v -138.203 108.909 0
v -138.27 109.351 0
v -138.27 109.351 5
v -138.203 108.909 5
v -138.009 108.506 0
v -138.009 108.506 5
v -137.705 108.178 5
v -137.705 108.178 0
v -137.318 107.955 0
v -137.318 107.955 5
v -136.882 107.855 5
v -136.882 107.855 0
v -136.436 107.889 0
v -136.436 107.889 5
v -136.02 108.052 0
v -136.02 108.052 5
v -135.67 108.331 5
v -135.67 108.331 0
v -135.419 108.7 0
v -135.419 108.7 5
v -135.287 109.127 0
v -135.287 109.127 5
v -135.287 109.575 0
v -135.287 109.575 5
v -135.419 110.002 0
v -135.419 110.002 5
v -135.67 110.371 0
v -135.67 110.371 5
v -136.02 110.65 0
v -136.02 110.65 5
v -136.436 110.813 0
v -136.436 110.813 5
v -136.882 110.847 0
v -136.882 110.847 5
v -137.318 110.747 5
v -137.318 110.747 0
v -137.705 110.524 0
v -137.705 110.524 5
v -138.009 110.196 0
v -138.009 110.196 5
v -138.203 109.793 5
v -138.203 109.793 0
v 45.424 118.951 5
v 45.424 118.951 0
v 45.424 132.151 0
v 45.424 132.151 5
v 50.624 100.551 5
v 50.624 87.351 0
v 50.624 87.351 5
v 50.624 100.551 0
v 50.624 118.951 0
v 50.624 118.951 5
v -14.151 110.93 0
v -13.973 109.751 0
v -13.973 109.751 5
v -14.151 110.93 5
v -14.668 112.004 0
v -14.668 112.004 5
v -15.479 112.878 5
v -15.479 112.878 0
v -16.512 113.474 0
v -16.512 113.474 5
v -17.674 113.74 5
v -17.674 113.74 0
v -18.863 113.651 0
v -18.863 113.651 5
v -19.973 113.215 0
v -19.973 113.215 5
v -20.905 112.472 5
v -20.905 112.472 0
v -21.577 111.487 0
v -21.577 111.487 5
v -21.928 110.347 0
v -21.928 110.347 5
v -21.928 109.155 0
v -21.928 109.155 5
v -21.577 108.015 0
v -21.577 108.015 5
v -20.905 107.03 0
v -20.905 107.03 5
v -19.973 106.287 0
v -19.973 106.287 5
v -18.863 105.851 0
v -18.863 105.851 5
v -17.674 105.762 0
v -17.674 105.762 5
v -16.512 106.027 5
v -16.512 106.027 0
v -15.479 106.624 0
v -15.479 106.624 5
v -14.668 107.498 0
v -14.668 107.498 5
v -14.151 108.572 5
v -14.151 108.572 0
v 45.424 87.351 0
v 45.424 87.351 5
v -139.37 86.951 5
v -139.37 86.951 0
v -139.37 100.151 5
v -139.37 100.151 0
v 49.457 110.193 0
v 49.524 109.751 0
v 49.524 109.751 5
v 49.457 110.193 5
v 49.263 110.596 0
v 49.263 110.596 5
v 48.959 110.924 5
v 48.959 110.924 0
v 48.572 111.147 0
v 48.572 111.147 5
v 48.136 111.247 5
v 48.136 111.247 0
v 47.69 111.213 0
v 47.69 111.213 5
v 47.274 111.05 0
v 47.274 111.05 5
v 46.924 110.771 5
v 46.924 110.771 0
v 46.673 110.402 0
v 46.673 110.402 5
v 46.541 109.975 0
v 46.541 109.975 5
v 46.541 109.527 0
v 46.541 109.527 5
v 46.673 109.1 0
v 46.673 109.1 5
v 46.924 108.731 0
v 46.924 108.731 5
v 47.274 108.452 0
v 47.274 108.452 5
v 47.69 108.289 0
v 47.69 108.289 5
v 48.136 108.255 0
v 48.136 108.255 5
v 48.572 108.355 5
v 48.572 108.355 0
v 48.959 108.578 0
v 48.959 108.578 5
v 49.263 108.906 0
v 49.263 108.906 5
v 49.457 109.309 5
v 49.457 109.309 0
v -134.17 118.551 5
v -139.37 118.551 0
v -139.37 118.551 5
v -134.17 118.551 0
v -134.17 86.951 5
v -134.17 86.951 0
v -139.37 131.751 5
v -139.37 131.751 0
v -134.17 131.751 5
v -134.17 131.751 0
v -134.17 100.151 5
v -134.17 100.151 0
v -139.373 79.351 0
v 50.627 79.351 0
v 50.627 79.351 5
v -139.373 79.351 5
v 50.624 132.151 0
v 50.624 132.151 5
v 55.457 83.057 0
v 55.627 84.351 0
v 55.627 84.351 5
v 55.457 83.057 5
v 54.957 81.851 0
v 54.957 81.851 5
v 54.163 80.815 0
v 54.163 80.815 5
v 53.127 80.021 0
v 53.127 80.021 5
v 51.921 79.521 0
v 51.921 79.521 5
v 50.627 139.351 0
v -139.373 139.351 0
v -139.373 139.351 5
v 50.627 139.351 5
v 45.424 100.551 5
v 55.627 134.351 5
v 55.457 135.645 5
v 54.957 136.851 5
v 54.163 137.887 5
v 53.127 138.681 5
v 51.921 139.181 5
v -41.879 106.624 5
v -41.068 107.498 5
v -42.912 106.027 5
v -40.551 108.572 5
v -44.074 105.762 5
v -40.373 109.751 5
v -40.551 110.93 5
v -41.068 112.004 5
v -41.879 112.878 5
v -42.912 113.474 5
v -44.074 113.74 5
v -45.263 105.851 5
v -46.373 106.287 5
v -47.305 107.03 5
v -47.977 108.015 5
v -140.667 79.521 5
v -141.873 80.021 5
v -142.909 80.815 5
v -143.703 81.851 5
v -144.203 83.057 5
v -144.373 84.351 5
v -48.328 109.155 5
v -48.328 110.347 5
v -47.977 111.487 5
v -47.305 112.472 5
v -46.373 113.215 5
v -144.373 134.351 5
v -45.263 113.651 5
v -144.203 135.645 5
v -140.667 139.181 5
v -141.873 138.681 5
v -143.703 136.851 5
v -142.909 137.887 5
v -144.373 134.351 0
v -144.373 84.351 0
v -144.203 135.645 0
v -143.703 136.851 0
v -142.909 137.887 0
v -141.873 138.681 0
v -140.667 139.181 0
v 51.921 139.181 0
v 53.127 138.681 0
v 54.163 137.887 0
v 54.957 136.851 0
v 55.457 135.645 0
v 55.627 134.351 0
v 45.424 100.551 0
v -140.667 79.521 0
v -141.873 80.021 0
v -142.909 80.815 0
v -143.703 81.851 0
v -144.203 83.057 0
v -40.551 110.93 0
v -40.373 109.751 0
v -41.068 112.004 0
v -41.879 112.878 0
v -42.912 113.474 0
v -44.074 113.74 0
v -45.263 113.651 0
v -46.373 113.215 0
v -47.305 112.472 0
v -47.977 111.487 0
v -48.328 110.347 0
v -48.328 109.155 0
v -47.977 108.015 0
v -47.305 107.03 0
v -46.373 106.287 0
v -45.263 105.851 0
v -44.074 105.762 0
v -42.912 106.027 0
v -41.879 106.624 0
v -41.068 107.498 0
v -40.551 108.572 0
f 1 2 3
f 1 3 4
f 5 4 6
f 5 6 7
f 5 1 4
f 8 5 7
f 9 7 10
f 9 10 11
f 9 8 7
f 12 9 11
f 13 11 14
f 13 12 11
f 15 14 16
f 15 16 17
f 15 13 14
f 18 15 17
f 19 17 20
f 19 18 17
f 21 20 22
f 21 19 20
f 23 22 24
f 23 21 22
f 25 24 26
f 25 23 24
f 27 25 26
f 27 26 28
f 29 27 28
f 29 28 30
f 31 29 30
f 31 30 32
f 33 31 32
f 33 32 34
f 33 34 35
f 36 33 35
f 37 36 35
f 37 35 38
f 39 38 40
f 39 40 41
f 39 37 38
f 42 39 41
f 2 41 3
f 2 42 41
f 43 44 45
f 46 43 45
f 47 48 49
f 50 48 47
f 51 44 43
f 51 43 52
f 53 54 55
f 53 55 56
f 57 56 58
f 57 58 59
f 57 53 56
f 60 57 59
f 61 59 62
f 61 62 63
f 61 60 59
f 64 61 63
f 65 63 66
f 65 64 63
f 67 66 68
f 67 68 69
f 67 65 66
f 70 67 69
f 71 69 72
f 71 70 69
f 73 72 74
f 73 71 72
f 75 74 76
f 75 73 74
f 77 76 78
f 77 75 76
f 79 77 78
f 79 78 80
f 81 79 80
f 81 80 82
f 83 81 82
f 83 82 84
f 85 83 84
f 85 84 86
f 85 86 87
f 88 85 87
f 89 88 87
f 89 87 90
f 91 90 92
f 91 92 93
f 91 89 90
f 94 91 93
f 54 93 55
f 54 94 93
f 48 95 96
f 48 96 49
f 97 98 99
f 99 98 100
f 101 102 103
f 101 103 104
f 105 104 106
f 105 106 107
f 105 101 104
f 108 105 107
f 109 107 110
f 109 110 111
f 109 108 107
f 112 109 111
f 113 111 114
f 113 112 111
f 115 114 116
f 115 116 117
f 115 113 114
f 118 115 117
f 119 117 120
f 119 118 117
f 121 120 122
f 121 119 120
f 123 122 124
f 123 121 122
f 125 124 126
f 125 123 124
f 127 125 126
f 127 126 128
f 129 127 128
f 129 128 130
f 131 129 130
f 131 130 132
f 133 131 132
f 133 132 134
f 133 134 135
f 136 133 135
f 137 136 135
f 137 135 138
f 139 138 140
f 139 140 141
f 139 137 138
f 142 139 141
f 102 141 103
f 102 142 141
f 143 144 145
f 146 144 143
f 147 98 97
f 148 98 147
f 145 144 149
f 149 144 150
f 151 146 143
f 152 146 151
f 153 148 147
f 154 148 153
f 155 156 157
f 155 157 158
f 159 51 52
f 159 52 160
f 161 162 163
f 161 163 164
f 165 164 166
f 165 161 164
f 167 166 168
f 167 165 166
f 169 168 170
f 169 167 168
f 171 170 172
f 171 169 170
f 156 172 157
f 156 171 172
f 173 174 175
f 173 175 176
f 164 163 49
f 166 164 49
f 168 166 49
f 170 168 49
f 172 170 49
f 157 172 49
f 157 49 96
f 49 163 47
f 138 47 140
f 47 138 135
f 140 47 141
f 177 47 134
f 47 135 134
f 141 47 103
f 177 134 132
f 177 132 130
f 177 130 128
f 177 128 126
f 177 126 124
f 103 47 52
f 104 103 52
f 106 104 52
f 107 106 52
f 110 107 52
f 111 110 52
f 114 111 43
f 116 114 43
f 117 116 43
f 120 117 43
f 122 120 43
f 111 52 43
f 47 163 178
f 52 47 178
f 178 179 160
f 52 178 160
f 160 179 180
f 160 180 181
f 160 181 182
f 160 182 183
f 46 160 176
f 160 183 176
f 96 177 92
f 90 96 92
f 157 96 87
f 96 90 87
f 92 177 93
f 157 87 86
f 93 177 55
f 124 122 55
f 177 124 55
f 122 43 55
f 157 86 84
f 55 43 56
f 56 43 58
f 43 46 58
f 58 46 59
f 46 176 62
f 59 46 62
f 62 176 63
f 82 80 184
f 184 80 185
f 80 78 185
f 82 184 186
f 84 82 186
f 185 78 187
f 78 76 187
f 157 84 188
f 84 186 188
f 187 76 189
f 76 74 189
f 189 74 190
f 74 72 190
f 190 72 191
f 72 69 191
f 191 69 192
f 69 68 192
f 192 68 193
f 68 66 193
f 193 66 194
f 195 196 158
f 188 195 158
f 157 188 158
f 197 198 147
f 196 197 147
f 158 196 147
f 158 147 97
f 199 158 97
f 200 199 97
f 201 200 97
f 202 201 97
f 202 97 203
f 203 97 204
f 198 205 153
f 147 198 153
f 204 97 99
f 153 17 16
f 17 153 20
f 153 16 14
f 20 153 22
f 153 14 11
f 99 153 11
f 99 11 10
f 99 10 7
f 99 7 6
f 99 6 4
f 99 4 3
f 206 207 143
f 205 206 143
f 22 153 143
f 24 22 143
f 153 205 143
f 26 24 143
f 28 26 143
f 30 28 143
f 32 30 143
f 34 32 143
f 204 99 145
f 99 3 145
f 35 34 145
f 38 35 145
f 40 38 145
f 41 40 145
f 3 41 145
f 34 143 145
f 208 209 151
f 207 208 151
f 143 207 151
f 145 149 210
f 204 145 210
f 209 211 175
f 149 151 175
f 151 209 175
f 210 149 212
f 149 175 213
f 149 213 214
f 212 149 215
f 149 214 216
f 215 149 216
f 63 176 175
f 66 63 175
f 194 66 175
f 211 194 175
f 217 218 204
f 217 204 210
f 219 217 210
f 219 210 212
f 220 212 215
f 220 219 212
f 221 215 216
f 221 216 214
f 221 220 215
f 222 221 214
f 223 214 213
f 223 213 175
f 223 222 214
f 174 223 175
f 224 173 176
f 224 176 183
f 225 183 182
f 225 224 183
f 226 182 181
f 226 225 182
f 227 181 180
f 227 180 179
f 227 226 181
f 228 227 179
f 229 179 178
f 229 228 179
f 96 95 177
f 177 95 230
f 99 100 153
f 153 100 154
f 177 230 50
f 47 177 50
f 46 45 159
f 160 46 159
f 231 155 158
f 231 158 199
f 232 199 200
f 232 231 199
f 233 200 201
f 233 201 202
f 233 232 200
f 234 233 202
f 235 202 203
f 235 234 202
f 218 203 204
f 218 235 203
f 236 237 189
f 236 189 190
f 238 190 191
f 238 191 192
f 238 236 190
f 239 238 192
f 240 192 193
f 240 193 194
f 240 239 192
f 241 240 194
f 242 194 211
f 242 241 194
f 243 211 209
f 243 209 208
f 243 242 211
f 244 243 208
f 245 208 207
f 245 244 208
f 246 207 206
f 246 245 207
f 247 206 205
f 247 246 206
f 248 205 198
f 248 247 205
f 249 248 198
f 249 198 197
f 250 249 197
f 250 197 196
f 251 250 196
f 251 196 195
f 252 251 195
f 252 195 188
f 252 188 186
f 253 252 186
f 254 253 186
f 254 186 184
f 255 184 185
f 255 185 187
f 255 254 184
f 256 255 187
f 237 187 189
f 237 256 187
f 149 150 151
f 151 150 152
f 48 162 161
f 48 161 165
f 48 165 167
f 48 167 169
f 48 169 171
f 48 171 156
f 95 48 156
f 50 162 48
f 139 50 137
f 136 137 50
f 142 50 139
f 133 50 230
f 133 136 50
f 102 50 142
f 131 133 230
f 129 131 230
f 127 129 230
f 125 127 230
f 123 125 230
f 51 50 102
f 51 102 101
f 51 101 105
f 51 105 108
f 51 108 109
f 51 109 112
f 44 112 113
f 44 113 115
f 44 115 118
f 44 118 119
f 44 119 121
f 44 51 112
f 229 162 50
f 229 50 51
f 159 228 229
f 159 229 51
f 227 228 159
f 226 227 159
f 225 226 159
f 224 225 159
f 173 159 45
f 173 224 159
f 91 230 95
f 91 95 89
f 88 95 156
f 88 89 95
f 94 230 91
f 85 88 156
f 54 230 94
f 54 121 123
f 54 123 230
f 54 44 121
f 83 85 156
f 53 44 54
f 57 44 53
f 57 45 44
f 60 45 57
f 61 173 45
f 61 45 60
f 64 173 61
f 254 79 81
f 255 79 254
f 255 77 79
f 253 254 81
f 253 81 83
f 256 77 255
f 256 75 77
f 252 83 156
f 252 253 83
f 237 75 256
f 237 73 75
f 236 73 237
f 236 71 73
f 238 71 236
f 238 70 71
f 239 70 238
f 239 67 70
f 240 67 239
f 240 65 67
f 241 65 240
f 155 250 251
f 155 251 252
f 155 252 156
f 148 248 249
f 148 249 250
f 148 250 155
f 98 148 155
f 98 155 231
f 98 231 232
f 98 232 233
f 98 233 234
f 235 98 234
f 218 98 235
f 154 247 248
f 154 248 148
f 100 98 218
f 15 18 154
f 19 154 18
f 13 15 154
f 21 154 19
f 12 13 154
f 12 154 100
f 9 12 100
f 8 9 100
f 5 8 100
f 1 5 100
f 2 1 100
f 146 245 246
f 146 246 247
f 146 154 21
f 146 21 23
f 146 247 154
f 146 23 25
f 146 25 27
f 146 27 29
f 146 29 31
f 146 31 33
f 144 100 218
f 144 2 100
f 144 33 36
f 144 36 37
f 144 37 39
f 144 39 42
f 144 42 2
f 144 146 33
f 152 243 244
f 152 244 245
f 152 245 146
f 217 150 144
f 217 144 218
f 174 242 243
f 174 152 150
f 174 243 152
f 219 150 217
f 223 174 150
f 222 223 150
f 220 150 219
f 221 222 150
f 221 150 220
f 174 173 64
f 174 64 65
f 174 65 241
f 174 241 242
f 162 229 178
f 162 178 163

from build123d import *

# Parameters (mm, degrees)
SKETCH1_R           = 1.5
SKETCH1_R_2         = 4
SKETCH1_W           = 5.2
SKETCH1_H           = 13.2
BOSS_EXTRUDE1_DEPTH = 5


with BuildPart() as part:
    # Sketch1 → Boss-Extrude1 (new body)
    with BuildSketch(Plane.XY):
        with BuildLine():
            Line((-139.3729909, 139.350971349), (50.6270091, 139.350971349))
            ThreePointArc((50.6270091, 139.350971349), (54.162543006, 137.886505255), (55.6270091, 134.350971349))
            Line((55.6270091, 134.350971349), (55.6270091, 84.350971349))
            ThreePointArc((55.6270091, 84.350971349), (54.162543006, 80.815437443), (50.6270091, 79.350971349))
            Line((50.6270091, 79.350971349), (-139.3729909, 79.350971349))
            ThreePointArc((-139.3729909, 79.350971349), (-142.908524806, 80.815437443), (-144.3729909, 84.350971349))
            Line((-144.3729909, 84.350971349), (-144.3729909, 134.350971349))
            ThreePointArc((-144.3729909, 134.350971349), (-142.908524806, 137.886505255), (-139.3729909, 139.350971349))
        make_face()
        with Locations((48.024043129, 109.750971349)):
            Circle(SKETCH1_R, mode=Mode.SUBTRACT)
        with Locations(Location((-136.770024929, 109.350971349, 0), (0, 0, 180))):
            Circle(SKETCH1_R, mode=Mode.SUBTRACT)
        with Locations((-44.3729909, 109.750971349)):
            Circle(SKETCH1_R_2, mode=Mode.SUBTRACT)
        with Locations((-17.9729909, 109.750971349)):
            Circle(SKETCH1_R_2, mode=Mode.SUBTRACT)
        with Locations((-136.770024929, 125.150971349)):
            Rectangle(SKETCH1_W, SKETCH1_H, mode=Mode.SUBTRACT)
        with Locations((48.024043129, 93.950971349)):
            Rectangle(SKETCH1_W, SKETCH1_H, mode=Mode.SUBTRACT)
        with Locations((48.024043129, 125.550971349)):
            Rectangle(SKETCH1_W, SKETCH1_H, mode=Mode.SUBTRACT)
        with Locations((-136.770024929, 93.550971349)):
            Rectangle(SKETCH1_W, SKETCH1_H, mode=Mode.SUBTRACT)
    extrude(amount=BOSS_EXTRUDE1_DEPTH)


solid = part.part
